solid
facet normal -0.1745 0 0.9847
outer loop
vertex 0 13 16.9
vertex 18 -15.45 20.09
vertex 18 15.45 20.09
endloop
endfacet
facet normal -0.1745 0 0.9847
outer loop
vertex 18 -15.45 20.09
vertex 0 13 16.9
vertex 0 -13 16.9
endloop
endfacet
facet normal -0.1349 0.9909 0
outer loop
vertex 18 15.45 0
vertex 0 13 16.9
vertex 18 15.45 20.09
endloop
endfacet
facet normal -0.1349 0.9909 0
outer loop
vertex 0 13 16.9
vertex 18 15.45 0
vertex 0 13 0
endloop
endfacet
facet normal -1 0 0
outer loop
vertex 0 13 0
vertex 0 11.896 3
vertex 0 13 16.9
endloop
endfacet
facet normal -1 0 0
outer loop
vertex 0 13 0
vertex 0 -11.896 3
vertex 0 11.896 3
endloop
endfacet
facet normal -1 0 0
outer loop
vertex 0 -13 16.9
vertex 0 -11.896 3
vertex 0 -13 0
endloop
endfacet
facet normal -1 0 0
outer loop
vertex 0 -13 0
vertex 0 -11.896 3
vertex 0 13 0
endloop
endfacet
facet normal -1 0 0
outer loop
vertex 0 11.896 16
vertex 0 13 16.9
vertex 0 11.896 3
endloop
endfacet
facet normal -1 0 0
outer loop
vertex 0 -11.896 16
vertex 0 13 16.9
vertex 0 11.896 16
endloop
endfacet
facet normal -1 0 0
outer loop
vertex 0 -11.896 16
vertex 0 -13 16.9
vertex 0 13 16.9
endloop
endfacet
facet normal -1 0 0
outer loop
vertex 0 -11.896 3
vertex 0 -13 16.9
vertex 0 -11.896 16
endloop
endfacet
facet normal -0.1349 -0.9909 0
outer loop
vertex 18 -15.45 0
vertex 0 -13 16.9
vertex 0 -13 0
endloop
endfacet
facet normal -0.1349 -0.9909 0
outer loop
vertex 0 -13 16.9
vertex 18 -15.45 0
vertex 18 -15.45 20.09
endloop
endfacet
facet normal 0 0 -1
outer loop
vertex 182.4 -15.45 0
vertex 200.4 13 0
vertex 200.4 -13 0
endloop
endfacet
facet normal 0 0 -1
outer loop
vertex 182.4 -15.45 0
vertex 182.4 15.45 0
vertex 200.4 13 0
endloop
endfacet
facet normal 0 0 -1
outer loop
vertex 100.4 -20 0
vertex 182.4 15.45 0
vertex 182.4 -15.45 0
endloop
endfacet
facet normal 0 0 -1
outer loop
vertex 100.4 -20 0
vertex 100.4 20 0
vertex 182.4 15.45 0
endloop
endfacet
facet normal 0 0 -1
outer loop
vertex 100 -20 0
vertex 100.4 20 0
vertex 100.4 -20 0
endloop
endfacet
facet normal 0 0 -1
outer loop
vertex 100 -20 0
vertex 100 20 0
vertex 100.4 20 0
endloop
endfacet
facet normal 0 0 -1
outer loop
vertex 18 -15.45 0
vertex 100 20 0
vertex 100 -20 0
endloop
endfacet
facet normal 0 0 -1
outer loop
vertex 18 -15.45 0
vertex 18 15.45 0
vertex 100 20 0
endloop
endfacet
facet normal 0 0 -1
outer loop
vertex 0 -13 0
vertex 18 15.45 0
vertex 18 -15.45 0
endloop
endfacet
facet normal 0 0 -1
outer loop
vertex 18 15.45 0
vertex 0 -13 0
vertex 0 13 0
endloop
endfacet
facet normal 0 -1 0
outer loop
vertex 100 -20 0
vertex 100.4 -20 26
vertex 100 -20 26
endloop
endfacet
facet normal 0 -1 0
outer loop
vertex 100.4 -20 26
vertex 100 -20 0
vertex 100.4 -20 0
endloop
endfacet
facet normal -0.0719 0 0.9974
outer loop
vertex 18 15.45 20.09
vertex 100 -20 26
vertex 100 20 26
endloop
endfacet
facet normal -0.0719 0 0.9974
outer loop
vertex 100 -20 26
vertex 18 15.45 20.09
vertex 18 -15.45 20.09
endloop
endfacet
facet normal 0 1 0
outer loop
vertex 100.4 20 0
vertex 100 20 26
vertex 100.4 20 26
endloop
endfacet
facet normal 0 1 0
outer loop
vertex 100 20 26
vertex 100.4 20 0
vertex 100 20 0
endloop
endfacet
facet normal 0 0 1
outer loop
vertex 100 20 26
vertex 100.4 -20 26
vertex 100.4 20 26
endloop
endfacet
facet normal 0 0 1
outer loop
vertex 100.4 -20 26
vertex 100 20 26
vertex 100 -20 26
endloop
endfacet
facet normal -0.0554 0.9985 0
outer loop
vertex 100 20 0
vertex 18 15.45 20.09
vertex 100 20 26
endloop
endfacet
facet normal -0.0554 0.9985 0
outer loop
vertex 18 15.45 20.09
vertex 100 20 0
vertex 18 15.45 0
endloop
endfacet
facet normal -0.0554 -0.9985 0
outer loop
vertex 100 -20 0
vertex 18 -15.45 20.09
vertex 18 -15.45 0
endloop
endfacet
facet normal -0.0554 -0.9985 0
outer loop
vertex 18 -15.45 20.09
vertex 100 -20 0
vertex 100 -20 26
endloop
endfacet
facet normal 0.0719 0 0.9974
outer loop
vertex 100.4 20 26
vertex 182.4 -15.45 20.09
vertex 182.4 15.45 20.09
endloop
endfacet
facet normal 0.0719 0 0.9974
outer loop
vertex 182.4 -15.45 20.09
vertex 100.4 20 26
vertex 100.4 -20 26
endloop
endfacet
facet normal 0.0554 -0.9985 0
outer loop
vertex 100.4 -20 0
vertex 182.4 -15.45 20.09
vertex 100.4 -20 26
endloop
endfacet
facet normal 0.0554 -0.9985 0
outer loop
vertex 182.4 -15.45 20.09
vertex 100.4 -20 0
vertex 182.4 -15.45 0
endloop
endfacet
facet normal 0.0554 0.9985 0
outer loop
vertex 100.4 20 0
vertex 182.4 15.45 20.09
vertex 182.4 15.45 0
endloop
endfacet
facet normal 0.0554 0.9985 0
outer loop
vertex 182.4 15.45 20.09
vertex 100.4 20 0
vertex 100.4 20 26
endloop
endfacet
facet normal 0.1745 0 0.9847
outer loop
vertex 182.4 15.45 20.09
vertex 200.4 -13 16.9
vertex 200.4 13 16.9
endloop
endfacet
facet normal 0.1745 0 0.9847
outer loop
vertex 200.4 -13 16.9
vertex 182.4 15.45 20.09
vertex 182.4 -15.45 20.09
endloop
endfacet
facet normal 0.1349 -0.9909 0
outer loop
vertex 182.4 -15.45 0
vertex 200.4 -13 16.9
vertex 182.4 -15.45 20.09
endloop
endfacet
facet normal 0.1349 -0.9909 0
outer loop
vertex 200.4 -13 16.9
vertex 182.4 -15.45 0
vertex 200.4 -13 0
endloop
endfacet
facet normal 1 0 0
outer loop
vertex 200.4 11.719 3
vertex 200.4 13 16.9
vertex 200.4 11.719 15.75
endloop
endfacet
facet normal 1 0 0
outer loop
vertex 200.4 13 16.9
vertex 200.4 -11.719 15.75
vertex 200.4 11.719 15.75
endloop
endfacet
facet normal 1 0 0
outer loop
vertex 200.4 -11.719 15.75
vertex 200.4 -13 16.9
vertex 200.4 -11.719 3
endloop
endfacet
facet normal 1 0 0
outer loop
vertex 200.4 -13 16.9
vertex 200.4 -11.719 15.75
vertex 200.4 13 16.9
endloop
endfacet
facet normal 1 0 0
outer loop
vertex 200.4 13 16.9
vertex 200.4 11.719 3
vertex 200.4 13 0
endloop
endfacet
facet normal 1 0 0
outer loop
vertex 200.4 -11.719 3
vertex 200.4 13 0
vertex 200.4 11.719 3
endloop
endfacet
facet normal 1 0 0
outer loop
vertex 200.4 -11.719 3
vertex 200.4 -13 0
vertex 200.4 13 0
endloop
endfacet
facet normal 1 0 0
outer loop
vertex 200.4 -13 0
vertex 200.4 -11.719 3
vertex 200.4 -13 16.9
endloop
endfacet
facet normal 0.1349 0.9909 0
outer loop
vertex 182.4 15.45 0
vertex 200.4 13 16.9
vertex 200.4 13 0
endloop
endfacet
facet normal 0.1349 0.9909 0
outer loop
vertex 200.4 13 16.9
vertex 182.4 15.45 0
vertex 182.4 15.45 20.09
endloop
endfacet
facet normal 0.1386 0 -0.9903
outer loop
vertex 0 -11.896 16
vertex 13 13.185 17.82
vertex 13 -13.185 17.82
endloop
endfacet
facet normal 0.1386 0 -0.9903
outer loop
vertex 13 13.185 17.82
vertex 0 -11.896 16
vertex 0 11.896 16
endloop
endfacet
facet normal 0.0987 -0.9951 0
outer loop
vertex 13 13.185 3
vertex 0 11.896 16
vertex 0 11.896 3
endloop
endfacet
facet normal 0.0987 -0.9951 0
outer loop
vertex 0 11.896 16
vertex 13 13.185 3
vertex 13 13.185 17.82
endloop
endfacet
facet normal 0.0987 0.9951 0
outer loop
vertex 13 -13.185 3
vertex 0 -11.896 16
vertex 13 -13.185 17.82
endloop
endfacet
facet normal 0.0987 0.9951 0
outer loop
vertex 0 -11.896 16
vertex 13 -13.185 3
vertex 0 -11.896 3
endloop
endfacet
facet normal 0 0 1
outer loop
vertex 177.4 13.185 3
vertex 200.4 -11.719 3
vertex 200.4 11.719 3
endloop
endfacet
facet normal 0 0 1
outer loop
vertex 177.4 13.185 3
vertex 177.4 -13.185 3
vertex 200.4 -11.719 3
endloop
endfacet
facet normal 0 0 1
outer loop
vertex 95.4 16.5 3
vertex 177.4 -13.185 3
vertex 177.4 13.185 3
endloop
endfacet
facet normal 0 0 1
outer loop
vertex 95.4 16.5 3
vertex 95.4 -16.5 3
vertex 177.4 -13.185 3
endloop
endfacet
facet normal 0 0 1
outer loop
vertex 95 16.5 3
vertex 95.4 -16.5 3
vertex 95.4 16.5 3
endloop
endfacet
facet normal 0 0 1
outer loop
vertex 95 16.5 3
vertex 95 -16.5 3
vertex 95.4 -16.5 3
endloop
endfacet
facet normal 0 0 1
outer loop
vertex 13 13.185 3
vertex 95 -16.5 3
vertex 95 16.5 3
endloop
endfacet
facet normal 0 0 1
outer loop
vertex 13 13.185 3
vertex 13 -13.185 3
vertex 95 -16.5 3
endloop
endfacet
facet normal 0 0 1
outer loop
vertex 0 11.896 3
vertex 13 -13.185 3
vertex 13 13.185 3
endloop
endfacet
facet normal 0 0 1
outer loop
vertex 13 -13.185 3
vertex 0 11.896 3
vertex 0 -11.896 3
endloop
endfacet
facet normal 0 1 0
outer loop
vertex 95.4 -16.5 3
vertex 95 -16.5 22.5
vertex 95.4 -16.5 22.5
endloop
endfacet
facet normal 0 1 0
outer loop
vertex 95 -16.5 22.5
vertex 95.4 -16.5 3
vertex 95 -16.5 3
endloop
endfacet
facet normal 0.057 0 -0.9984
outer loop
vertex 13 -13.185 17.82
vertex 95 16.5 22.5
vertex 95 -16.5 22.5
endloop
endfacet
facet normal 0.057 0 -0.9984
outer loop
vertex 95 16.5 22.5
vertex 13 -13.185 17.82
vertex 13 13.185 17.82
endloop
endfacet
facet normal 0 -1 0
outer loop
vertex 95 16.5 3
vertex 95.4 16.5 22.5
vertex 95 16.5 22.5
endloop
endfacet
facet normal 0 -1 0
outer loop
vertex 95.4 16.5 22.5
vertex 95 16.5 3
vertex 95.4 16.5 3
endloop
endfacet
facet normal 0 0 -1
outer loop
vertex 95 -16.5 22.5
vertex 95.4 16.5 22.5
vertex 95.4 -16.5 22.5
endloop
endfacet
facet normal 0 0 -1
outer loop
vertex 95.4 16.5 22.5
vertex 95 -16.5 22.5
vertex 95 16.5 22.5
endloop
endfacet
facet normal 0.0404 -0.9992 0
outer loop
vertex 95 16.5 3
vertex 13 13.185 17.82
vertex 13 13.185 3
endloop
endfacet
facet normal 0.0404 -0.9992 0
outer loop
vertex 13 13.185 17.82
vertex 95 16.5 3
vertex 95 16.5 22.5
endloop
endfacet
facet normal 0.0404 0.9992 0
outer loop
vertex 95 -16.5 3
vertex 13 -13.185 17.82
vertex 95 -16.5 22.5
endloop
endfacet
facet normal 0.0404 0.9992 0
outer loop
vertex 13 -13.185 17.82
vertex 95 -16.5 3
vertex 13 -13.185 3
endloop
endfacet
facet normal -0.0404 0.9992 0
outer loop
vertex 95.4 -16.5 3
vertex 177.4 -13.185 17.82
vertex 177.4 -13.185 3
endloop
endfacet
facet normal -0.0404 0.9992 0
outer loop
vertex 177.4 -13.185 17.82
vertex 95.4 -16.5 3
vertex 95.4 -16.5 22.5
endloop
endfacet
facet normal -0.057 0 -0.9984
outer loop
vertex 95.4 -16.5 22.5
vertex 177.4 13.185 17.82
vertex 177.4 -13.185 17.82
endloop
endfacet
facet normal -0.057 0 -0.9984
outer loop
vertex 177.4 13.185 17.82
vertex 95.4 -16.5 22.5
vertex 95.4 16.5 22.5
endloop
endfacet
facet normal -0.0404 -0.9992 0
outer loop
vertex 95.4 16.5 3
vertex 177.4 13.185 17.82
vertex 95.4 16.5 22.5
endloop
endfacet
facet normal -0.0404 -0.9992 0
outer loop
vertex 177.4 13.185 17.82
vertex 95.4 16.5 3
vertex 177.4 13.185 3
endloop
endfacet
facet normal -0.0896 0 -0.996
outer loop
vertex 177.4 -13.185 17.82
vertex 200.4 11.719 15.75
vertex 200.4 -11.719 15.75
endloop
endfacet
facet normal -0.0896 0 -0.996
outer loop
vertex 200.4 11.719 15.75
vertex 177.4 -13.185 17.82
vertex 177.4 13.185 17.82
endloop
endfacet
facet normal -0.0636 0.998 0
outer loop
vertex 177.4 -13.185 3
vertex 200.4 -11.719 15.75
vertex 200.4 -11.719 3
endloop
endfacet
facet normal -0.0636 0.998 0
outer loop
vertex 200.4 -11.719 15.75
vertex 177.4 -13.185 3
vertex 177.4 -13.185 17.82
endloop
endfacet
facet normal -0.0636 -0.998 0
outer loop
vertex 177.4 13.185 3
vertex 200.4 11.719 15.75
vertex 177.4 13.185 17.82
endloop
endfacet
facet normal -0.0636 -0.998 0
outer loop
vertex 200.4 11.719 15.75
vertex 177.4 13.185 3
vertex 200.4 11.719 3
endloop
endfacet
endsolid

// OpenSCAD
$fn = 32;

// ----------------------------------------------------------------------
// Faired channel: 200 x 40 x 26 mm, 3.5 mm walls, faired ends
// ----------------------------------------------------------------------

// --- parameters (mm) ---
length = 200;             // channel length
width = 40;               // channel width at mid length
height = 26;              // channel height at mid length
wall = 3.5;               // side wall thickness
floor_t = 3;              // floor thickness
end_w = 26;               // faired end width
end_h = 16.9;             // faired end height

difference() {
  union() {
    hull() {
      translate([0, -13, 0]) cube([0.4, 26, 16.9]);
      translate([18, -15.45, 0]) cube([0.4, 30.9, 20.09]);
    }
    hull() {
      translate([18, -15.45, 0]) cube([0.4, 30.9, 20.09]);
      translate([100, -20, 0]) cube([0.4, 40, 26]);
    }
    hull() {
      translate([100, -20, 0]) cube([0.4, 40, 26]);
      translate([182, -15.45, 0]) cube([0.4, 30.9, 20.09]);
    }
    hull() {
      translate([182, -15.45, 0]) cube([0.4, 30.9, 20.09]);
      translate([200, -13, 0]) cube([0.4, 26, 16.9]);
    }
  }
  /* cavity, 5 mm proud of both ends so the ports are cut clean */
  hull() {
    translate([-5, -11.4, 3]) cube([0.4, 22.8, 12.3]);
    translate([13, -13.185, 3]) cube([0.4, 26.37, 14.82]);
  }
  hull() {
    translate([13, -13.185, 3]) cube([0.4, 26.37, 14.82]);
    translate([95, -16.5, 3]) cube([0.4, 33, 19.5]);
  }
  hull() {
    translate([95, -16.5, 3]) cube([0.4, 33, 19.5]);
    translate([177, -13.185, 3]) cube([0.4, 26.37, 14.82]);
  }
  hull() {
    translate([177, -13.185, 3]) cube([0.4, 26.37, 14.82]);
    translate([205, -11.4, 3]) cube([0.4, 22.8, 12.3]);
  }
}
